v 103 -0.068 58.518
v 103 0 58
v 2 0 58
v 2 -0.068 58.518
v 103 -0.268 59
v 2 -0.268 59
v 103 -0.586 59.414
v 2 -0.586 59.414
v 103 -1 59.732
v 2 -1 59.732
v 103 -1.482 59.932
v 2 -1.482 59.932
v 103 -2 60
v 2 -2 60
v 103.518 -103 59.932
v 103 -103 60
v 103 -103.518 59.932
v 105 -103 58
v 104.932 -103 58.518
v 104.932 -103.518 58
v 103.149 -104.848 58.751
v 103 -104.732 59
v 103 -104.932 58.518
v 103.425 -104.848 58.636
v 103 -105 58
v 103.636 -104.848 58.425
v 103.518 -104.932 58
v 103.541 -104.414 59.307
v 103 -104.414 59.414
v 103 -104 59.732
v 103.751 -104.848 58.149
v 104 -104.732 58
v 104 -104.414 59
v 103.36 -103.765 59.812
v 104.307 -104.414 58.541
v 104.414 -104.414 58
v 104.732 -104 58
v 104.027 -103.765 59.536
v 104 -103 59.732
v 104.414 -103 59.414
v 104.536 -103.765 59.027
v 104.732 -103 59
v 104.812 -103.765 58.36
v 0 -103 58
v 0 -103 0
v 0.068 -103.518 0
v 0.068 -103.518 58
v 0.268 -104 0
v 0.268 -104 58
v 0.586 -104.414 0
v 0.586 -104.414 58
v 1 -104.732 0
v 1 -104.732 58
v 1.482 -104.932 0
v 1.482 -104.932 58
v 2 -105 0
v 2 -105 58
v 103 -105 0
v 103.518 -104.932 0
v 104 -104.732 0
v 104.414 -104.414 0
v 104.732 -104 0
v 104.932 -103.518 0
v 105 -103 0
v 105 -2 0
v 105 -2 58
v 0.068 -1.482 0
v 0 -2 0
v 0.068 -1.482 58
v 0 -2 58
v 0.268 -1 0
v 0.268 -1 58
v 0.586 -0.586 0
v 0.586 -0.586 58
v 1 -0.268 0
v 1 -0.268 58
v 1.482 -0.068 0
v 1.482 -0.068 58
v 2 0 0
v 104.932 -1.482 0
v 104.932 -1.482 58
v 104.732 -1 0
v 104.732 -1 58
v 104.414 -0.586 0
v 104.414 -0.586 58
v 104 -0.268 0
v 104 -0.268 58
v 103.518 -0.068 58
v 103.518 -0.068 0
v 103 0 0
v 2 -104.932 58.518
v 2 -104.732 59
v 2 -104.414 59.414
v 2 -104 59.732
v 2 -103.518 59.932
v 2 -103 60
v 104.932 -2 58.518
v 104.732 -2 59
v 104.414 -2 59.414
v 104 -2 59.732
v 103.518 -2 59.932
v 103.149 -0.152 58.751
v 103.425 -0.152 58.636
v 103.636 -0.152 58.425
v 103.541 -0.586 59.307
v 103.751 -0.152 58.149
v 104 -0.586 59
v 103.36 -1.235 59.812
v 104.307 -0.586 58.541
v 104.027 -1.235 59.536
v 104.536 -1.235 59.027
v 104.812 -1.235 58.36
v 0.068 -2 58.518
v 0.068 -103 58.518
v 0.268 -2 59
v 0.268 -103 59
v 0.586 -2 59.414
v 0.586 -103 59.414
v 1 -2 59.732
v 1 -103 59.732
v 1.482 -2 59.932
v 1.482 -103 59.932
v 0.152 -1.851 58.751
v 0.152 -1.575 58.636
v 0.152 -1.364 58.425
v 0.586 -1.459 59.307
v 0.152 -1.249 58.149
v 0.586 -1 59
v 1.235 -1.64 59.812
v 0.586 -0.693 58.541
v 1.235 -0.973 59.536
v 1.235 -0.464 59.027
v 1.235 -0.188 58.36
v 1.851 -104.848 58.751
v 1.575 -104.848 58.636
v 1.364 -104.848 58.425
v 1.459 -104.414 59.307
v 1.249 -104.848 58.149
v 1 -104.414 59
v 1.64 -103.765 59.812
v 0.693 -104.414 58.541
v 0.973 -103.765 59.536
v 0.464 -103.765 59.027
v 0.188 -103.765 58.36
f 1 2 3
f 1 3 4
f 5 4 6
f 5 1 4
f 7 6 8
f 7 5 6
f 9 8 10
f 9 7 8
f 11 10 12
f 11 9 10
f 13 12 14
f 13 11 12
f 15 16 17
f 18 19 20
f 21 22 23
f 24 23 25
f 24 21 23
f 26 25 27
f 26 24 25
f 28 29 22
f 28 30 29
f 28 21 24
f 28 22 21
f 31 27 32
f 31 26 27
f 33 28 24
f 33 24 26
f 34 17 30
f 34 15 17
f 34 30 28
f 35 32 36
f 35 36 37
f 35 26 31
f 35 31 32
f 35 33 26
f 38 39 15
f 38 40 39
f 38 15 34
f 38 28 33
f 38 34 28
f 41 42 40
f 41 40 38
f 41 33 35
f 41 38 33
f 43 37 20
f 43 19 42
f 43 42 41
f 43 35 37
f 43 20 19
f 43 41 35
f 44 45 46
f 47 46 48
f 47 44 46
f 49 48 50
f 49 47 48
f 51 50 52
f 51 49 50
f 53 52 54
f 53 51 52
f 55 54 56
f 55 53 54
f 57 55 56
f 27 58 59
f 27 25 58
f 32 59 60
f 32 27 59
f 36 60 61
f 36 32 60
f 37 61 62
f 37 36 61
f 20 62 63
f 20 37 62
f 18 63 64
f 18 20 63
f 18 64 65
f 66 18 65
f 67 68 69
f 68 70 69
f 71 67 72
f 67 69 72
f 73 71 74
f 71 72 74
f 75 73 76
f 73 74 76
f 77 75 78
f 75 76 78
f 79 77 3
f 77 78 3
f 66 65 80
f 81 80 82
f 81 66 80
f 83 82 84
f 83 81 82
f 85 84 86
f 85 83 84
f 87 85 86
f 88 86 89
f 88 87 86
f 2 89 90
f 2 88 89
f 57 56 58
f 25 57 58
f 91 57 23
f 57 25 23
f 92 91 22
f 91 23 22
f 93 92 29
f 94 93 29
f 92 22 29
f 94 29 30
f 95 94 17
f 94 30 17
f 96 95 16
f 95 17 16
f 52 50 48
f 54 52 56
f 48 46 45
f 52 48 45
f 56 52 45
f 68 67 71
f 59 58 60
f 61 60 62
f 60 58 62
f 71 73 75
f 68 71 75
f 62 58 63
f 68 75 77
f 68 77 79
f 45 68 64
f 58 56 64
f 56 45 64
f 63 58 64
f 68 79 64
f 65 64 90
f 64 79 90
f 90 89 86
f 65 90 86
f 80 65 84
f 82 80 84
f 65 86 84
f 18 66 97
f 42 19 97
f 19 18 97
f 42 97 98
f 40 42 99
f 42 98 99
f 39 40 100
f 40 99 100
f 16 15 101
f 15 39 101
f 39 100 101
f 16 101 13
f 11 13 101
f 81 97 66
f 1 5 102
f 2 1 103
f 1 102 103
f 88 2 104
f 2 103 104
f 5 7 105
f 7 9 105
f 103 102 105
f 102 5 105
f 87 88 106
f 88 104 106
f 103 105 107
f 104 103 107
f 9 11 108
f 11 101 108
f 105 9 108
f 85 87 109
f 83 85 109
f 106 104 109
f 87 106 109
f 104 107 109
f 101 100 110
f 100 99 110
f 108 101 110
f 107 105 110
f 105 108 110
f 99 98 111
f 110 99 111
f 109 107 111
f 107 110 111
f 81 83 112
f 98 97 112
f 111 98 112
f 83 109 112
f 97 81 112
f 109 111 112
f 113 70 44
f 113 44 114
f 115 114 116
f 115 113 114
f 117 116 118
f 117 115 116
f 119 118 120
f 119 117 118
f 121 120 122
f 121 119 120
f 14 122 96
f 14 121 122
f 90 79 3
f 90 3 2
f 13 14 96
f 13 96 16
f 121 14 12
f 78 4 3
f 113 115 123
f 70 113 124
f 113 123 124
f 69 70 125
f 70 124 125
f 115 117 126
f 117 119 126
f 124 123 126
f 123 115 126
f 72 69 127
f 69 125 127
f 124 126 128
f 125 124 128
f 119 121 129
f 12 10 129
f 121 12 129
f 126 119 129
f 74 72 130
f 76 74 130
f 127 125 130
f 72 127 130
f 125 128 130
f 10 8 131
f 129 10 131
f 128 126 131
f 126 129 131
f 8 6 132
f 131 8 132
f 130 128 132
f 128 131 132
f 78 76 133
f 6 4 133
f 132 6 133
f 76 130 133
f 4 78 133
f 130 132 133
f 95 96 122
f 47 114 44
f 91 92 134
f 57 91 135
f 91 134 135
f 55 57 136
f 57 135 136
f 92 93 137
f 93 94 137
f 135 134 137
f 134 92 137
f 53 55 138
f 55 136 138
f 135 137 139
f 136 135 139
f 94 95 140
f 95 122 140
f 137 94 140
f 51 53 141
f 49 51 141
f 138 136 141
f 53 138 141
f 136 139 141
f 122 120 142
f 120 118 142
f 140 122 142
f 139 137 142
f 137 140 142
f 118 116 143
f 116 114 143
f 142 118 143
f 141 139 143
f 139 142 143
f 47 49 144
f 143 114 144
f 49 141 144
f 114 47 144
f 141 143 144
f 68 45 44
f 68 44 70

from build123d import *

# Parameters (mm, degrees)
CROQUIS1_W              = 105
CROQUIS1_H              = 105
SALIENTE_EXTRUIR1_DEPTH = 60
REDONDEO1_R             = 2


with BuildPart() as part:
    # Croquis1 → Saliente-Extruir1 (new body)
    with BuildSketch(Plane.XY):
        with Locations((52.5, -52.5)):
            Rectangle(CROQUIS1_W, CROQUIS1_H)
    extrude(amount=SALIENTE_EXTRUIR1_DEPTH)

    # Redondeo1
    redondeo1_edges = [part.edges().sort_by_distance(p)[0] for p in [
        (105, -52.5, 60),
        (52.5, 0, 60),
        (0, -52.5, 60),
        (52.5, -105, 60),
        (0, 0, 30),
        (105, 0, 30),
        (105, -105, 30),
        (0, -105, 30),
    ]]
    fillet(redondeo1_edges, radius=REDONDEO1_R)


solid = part.part
